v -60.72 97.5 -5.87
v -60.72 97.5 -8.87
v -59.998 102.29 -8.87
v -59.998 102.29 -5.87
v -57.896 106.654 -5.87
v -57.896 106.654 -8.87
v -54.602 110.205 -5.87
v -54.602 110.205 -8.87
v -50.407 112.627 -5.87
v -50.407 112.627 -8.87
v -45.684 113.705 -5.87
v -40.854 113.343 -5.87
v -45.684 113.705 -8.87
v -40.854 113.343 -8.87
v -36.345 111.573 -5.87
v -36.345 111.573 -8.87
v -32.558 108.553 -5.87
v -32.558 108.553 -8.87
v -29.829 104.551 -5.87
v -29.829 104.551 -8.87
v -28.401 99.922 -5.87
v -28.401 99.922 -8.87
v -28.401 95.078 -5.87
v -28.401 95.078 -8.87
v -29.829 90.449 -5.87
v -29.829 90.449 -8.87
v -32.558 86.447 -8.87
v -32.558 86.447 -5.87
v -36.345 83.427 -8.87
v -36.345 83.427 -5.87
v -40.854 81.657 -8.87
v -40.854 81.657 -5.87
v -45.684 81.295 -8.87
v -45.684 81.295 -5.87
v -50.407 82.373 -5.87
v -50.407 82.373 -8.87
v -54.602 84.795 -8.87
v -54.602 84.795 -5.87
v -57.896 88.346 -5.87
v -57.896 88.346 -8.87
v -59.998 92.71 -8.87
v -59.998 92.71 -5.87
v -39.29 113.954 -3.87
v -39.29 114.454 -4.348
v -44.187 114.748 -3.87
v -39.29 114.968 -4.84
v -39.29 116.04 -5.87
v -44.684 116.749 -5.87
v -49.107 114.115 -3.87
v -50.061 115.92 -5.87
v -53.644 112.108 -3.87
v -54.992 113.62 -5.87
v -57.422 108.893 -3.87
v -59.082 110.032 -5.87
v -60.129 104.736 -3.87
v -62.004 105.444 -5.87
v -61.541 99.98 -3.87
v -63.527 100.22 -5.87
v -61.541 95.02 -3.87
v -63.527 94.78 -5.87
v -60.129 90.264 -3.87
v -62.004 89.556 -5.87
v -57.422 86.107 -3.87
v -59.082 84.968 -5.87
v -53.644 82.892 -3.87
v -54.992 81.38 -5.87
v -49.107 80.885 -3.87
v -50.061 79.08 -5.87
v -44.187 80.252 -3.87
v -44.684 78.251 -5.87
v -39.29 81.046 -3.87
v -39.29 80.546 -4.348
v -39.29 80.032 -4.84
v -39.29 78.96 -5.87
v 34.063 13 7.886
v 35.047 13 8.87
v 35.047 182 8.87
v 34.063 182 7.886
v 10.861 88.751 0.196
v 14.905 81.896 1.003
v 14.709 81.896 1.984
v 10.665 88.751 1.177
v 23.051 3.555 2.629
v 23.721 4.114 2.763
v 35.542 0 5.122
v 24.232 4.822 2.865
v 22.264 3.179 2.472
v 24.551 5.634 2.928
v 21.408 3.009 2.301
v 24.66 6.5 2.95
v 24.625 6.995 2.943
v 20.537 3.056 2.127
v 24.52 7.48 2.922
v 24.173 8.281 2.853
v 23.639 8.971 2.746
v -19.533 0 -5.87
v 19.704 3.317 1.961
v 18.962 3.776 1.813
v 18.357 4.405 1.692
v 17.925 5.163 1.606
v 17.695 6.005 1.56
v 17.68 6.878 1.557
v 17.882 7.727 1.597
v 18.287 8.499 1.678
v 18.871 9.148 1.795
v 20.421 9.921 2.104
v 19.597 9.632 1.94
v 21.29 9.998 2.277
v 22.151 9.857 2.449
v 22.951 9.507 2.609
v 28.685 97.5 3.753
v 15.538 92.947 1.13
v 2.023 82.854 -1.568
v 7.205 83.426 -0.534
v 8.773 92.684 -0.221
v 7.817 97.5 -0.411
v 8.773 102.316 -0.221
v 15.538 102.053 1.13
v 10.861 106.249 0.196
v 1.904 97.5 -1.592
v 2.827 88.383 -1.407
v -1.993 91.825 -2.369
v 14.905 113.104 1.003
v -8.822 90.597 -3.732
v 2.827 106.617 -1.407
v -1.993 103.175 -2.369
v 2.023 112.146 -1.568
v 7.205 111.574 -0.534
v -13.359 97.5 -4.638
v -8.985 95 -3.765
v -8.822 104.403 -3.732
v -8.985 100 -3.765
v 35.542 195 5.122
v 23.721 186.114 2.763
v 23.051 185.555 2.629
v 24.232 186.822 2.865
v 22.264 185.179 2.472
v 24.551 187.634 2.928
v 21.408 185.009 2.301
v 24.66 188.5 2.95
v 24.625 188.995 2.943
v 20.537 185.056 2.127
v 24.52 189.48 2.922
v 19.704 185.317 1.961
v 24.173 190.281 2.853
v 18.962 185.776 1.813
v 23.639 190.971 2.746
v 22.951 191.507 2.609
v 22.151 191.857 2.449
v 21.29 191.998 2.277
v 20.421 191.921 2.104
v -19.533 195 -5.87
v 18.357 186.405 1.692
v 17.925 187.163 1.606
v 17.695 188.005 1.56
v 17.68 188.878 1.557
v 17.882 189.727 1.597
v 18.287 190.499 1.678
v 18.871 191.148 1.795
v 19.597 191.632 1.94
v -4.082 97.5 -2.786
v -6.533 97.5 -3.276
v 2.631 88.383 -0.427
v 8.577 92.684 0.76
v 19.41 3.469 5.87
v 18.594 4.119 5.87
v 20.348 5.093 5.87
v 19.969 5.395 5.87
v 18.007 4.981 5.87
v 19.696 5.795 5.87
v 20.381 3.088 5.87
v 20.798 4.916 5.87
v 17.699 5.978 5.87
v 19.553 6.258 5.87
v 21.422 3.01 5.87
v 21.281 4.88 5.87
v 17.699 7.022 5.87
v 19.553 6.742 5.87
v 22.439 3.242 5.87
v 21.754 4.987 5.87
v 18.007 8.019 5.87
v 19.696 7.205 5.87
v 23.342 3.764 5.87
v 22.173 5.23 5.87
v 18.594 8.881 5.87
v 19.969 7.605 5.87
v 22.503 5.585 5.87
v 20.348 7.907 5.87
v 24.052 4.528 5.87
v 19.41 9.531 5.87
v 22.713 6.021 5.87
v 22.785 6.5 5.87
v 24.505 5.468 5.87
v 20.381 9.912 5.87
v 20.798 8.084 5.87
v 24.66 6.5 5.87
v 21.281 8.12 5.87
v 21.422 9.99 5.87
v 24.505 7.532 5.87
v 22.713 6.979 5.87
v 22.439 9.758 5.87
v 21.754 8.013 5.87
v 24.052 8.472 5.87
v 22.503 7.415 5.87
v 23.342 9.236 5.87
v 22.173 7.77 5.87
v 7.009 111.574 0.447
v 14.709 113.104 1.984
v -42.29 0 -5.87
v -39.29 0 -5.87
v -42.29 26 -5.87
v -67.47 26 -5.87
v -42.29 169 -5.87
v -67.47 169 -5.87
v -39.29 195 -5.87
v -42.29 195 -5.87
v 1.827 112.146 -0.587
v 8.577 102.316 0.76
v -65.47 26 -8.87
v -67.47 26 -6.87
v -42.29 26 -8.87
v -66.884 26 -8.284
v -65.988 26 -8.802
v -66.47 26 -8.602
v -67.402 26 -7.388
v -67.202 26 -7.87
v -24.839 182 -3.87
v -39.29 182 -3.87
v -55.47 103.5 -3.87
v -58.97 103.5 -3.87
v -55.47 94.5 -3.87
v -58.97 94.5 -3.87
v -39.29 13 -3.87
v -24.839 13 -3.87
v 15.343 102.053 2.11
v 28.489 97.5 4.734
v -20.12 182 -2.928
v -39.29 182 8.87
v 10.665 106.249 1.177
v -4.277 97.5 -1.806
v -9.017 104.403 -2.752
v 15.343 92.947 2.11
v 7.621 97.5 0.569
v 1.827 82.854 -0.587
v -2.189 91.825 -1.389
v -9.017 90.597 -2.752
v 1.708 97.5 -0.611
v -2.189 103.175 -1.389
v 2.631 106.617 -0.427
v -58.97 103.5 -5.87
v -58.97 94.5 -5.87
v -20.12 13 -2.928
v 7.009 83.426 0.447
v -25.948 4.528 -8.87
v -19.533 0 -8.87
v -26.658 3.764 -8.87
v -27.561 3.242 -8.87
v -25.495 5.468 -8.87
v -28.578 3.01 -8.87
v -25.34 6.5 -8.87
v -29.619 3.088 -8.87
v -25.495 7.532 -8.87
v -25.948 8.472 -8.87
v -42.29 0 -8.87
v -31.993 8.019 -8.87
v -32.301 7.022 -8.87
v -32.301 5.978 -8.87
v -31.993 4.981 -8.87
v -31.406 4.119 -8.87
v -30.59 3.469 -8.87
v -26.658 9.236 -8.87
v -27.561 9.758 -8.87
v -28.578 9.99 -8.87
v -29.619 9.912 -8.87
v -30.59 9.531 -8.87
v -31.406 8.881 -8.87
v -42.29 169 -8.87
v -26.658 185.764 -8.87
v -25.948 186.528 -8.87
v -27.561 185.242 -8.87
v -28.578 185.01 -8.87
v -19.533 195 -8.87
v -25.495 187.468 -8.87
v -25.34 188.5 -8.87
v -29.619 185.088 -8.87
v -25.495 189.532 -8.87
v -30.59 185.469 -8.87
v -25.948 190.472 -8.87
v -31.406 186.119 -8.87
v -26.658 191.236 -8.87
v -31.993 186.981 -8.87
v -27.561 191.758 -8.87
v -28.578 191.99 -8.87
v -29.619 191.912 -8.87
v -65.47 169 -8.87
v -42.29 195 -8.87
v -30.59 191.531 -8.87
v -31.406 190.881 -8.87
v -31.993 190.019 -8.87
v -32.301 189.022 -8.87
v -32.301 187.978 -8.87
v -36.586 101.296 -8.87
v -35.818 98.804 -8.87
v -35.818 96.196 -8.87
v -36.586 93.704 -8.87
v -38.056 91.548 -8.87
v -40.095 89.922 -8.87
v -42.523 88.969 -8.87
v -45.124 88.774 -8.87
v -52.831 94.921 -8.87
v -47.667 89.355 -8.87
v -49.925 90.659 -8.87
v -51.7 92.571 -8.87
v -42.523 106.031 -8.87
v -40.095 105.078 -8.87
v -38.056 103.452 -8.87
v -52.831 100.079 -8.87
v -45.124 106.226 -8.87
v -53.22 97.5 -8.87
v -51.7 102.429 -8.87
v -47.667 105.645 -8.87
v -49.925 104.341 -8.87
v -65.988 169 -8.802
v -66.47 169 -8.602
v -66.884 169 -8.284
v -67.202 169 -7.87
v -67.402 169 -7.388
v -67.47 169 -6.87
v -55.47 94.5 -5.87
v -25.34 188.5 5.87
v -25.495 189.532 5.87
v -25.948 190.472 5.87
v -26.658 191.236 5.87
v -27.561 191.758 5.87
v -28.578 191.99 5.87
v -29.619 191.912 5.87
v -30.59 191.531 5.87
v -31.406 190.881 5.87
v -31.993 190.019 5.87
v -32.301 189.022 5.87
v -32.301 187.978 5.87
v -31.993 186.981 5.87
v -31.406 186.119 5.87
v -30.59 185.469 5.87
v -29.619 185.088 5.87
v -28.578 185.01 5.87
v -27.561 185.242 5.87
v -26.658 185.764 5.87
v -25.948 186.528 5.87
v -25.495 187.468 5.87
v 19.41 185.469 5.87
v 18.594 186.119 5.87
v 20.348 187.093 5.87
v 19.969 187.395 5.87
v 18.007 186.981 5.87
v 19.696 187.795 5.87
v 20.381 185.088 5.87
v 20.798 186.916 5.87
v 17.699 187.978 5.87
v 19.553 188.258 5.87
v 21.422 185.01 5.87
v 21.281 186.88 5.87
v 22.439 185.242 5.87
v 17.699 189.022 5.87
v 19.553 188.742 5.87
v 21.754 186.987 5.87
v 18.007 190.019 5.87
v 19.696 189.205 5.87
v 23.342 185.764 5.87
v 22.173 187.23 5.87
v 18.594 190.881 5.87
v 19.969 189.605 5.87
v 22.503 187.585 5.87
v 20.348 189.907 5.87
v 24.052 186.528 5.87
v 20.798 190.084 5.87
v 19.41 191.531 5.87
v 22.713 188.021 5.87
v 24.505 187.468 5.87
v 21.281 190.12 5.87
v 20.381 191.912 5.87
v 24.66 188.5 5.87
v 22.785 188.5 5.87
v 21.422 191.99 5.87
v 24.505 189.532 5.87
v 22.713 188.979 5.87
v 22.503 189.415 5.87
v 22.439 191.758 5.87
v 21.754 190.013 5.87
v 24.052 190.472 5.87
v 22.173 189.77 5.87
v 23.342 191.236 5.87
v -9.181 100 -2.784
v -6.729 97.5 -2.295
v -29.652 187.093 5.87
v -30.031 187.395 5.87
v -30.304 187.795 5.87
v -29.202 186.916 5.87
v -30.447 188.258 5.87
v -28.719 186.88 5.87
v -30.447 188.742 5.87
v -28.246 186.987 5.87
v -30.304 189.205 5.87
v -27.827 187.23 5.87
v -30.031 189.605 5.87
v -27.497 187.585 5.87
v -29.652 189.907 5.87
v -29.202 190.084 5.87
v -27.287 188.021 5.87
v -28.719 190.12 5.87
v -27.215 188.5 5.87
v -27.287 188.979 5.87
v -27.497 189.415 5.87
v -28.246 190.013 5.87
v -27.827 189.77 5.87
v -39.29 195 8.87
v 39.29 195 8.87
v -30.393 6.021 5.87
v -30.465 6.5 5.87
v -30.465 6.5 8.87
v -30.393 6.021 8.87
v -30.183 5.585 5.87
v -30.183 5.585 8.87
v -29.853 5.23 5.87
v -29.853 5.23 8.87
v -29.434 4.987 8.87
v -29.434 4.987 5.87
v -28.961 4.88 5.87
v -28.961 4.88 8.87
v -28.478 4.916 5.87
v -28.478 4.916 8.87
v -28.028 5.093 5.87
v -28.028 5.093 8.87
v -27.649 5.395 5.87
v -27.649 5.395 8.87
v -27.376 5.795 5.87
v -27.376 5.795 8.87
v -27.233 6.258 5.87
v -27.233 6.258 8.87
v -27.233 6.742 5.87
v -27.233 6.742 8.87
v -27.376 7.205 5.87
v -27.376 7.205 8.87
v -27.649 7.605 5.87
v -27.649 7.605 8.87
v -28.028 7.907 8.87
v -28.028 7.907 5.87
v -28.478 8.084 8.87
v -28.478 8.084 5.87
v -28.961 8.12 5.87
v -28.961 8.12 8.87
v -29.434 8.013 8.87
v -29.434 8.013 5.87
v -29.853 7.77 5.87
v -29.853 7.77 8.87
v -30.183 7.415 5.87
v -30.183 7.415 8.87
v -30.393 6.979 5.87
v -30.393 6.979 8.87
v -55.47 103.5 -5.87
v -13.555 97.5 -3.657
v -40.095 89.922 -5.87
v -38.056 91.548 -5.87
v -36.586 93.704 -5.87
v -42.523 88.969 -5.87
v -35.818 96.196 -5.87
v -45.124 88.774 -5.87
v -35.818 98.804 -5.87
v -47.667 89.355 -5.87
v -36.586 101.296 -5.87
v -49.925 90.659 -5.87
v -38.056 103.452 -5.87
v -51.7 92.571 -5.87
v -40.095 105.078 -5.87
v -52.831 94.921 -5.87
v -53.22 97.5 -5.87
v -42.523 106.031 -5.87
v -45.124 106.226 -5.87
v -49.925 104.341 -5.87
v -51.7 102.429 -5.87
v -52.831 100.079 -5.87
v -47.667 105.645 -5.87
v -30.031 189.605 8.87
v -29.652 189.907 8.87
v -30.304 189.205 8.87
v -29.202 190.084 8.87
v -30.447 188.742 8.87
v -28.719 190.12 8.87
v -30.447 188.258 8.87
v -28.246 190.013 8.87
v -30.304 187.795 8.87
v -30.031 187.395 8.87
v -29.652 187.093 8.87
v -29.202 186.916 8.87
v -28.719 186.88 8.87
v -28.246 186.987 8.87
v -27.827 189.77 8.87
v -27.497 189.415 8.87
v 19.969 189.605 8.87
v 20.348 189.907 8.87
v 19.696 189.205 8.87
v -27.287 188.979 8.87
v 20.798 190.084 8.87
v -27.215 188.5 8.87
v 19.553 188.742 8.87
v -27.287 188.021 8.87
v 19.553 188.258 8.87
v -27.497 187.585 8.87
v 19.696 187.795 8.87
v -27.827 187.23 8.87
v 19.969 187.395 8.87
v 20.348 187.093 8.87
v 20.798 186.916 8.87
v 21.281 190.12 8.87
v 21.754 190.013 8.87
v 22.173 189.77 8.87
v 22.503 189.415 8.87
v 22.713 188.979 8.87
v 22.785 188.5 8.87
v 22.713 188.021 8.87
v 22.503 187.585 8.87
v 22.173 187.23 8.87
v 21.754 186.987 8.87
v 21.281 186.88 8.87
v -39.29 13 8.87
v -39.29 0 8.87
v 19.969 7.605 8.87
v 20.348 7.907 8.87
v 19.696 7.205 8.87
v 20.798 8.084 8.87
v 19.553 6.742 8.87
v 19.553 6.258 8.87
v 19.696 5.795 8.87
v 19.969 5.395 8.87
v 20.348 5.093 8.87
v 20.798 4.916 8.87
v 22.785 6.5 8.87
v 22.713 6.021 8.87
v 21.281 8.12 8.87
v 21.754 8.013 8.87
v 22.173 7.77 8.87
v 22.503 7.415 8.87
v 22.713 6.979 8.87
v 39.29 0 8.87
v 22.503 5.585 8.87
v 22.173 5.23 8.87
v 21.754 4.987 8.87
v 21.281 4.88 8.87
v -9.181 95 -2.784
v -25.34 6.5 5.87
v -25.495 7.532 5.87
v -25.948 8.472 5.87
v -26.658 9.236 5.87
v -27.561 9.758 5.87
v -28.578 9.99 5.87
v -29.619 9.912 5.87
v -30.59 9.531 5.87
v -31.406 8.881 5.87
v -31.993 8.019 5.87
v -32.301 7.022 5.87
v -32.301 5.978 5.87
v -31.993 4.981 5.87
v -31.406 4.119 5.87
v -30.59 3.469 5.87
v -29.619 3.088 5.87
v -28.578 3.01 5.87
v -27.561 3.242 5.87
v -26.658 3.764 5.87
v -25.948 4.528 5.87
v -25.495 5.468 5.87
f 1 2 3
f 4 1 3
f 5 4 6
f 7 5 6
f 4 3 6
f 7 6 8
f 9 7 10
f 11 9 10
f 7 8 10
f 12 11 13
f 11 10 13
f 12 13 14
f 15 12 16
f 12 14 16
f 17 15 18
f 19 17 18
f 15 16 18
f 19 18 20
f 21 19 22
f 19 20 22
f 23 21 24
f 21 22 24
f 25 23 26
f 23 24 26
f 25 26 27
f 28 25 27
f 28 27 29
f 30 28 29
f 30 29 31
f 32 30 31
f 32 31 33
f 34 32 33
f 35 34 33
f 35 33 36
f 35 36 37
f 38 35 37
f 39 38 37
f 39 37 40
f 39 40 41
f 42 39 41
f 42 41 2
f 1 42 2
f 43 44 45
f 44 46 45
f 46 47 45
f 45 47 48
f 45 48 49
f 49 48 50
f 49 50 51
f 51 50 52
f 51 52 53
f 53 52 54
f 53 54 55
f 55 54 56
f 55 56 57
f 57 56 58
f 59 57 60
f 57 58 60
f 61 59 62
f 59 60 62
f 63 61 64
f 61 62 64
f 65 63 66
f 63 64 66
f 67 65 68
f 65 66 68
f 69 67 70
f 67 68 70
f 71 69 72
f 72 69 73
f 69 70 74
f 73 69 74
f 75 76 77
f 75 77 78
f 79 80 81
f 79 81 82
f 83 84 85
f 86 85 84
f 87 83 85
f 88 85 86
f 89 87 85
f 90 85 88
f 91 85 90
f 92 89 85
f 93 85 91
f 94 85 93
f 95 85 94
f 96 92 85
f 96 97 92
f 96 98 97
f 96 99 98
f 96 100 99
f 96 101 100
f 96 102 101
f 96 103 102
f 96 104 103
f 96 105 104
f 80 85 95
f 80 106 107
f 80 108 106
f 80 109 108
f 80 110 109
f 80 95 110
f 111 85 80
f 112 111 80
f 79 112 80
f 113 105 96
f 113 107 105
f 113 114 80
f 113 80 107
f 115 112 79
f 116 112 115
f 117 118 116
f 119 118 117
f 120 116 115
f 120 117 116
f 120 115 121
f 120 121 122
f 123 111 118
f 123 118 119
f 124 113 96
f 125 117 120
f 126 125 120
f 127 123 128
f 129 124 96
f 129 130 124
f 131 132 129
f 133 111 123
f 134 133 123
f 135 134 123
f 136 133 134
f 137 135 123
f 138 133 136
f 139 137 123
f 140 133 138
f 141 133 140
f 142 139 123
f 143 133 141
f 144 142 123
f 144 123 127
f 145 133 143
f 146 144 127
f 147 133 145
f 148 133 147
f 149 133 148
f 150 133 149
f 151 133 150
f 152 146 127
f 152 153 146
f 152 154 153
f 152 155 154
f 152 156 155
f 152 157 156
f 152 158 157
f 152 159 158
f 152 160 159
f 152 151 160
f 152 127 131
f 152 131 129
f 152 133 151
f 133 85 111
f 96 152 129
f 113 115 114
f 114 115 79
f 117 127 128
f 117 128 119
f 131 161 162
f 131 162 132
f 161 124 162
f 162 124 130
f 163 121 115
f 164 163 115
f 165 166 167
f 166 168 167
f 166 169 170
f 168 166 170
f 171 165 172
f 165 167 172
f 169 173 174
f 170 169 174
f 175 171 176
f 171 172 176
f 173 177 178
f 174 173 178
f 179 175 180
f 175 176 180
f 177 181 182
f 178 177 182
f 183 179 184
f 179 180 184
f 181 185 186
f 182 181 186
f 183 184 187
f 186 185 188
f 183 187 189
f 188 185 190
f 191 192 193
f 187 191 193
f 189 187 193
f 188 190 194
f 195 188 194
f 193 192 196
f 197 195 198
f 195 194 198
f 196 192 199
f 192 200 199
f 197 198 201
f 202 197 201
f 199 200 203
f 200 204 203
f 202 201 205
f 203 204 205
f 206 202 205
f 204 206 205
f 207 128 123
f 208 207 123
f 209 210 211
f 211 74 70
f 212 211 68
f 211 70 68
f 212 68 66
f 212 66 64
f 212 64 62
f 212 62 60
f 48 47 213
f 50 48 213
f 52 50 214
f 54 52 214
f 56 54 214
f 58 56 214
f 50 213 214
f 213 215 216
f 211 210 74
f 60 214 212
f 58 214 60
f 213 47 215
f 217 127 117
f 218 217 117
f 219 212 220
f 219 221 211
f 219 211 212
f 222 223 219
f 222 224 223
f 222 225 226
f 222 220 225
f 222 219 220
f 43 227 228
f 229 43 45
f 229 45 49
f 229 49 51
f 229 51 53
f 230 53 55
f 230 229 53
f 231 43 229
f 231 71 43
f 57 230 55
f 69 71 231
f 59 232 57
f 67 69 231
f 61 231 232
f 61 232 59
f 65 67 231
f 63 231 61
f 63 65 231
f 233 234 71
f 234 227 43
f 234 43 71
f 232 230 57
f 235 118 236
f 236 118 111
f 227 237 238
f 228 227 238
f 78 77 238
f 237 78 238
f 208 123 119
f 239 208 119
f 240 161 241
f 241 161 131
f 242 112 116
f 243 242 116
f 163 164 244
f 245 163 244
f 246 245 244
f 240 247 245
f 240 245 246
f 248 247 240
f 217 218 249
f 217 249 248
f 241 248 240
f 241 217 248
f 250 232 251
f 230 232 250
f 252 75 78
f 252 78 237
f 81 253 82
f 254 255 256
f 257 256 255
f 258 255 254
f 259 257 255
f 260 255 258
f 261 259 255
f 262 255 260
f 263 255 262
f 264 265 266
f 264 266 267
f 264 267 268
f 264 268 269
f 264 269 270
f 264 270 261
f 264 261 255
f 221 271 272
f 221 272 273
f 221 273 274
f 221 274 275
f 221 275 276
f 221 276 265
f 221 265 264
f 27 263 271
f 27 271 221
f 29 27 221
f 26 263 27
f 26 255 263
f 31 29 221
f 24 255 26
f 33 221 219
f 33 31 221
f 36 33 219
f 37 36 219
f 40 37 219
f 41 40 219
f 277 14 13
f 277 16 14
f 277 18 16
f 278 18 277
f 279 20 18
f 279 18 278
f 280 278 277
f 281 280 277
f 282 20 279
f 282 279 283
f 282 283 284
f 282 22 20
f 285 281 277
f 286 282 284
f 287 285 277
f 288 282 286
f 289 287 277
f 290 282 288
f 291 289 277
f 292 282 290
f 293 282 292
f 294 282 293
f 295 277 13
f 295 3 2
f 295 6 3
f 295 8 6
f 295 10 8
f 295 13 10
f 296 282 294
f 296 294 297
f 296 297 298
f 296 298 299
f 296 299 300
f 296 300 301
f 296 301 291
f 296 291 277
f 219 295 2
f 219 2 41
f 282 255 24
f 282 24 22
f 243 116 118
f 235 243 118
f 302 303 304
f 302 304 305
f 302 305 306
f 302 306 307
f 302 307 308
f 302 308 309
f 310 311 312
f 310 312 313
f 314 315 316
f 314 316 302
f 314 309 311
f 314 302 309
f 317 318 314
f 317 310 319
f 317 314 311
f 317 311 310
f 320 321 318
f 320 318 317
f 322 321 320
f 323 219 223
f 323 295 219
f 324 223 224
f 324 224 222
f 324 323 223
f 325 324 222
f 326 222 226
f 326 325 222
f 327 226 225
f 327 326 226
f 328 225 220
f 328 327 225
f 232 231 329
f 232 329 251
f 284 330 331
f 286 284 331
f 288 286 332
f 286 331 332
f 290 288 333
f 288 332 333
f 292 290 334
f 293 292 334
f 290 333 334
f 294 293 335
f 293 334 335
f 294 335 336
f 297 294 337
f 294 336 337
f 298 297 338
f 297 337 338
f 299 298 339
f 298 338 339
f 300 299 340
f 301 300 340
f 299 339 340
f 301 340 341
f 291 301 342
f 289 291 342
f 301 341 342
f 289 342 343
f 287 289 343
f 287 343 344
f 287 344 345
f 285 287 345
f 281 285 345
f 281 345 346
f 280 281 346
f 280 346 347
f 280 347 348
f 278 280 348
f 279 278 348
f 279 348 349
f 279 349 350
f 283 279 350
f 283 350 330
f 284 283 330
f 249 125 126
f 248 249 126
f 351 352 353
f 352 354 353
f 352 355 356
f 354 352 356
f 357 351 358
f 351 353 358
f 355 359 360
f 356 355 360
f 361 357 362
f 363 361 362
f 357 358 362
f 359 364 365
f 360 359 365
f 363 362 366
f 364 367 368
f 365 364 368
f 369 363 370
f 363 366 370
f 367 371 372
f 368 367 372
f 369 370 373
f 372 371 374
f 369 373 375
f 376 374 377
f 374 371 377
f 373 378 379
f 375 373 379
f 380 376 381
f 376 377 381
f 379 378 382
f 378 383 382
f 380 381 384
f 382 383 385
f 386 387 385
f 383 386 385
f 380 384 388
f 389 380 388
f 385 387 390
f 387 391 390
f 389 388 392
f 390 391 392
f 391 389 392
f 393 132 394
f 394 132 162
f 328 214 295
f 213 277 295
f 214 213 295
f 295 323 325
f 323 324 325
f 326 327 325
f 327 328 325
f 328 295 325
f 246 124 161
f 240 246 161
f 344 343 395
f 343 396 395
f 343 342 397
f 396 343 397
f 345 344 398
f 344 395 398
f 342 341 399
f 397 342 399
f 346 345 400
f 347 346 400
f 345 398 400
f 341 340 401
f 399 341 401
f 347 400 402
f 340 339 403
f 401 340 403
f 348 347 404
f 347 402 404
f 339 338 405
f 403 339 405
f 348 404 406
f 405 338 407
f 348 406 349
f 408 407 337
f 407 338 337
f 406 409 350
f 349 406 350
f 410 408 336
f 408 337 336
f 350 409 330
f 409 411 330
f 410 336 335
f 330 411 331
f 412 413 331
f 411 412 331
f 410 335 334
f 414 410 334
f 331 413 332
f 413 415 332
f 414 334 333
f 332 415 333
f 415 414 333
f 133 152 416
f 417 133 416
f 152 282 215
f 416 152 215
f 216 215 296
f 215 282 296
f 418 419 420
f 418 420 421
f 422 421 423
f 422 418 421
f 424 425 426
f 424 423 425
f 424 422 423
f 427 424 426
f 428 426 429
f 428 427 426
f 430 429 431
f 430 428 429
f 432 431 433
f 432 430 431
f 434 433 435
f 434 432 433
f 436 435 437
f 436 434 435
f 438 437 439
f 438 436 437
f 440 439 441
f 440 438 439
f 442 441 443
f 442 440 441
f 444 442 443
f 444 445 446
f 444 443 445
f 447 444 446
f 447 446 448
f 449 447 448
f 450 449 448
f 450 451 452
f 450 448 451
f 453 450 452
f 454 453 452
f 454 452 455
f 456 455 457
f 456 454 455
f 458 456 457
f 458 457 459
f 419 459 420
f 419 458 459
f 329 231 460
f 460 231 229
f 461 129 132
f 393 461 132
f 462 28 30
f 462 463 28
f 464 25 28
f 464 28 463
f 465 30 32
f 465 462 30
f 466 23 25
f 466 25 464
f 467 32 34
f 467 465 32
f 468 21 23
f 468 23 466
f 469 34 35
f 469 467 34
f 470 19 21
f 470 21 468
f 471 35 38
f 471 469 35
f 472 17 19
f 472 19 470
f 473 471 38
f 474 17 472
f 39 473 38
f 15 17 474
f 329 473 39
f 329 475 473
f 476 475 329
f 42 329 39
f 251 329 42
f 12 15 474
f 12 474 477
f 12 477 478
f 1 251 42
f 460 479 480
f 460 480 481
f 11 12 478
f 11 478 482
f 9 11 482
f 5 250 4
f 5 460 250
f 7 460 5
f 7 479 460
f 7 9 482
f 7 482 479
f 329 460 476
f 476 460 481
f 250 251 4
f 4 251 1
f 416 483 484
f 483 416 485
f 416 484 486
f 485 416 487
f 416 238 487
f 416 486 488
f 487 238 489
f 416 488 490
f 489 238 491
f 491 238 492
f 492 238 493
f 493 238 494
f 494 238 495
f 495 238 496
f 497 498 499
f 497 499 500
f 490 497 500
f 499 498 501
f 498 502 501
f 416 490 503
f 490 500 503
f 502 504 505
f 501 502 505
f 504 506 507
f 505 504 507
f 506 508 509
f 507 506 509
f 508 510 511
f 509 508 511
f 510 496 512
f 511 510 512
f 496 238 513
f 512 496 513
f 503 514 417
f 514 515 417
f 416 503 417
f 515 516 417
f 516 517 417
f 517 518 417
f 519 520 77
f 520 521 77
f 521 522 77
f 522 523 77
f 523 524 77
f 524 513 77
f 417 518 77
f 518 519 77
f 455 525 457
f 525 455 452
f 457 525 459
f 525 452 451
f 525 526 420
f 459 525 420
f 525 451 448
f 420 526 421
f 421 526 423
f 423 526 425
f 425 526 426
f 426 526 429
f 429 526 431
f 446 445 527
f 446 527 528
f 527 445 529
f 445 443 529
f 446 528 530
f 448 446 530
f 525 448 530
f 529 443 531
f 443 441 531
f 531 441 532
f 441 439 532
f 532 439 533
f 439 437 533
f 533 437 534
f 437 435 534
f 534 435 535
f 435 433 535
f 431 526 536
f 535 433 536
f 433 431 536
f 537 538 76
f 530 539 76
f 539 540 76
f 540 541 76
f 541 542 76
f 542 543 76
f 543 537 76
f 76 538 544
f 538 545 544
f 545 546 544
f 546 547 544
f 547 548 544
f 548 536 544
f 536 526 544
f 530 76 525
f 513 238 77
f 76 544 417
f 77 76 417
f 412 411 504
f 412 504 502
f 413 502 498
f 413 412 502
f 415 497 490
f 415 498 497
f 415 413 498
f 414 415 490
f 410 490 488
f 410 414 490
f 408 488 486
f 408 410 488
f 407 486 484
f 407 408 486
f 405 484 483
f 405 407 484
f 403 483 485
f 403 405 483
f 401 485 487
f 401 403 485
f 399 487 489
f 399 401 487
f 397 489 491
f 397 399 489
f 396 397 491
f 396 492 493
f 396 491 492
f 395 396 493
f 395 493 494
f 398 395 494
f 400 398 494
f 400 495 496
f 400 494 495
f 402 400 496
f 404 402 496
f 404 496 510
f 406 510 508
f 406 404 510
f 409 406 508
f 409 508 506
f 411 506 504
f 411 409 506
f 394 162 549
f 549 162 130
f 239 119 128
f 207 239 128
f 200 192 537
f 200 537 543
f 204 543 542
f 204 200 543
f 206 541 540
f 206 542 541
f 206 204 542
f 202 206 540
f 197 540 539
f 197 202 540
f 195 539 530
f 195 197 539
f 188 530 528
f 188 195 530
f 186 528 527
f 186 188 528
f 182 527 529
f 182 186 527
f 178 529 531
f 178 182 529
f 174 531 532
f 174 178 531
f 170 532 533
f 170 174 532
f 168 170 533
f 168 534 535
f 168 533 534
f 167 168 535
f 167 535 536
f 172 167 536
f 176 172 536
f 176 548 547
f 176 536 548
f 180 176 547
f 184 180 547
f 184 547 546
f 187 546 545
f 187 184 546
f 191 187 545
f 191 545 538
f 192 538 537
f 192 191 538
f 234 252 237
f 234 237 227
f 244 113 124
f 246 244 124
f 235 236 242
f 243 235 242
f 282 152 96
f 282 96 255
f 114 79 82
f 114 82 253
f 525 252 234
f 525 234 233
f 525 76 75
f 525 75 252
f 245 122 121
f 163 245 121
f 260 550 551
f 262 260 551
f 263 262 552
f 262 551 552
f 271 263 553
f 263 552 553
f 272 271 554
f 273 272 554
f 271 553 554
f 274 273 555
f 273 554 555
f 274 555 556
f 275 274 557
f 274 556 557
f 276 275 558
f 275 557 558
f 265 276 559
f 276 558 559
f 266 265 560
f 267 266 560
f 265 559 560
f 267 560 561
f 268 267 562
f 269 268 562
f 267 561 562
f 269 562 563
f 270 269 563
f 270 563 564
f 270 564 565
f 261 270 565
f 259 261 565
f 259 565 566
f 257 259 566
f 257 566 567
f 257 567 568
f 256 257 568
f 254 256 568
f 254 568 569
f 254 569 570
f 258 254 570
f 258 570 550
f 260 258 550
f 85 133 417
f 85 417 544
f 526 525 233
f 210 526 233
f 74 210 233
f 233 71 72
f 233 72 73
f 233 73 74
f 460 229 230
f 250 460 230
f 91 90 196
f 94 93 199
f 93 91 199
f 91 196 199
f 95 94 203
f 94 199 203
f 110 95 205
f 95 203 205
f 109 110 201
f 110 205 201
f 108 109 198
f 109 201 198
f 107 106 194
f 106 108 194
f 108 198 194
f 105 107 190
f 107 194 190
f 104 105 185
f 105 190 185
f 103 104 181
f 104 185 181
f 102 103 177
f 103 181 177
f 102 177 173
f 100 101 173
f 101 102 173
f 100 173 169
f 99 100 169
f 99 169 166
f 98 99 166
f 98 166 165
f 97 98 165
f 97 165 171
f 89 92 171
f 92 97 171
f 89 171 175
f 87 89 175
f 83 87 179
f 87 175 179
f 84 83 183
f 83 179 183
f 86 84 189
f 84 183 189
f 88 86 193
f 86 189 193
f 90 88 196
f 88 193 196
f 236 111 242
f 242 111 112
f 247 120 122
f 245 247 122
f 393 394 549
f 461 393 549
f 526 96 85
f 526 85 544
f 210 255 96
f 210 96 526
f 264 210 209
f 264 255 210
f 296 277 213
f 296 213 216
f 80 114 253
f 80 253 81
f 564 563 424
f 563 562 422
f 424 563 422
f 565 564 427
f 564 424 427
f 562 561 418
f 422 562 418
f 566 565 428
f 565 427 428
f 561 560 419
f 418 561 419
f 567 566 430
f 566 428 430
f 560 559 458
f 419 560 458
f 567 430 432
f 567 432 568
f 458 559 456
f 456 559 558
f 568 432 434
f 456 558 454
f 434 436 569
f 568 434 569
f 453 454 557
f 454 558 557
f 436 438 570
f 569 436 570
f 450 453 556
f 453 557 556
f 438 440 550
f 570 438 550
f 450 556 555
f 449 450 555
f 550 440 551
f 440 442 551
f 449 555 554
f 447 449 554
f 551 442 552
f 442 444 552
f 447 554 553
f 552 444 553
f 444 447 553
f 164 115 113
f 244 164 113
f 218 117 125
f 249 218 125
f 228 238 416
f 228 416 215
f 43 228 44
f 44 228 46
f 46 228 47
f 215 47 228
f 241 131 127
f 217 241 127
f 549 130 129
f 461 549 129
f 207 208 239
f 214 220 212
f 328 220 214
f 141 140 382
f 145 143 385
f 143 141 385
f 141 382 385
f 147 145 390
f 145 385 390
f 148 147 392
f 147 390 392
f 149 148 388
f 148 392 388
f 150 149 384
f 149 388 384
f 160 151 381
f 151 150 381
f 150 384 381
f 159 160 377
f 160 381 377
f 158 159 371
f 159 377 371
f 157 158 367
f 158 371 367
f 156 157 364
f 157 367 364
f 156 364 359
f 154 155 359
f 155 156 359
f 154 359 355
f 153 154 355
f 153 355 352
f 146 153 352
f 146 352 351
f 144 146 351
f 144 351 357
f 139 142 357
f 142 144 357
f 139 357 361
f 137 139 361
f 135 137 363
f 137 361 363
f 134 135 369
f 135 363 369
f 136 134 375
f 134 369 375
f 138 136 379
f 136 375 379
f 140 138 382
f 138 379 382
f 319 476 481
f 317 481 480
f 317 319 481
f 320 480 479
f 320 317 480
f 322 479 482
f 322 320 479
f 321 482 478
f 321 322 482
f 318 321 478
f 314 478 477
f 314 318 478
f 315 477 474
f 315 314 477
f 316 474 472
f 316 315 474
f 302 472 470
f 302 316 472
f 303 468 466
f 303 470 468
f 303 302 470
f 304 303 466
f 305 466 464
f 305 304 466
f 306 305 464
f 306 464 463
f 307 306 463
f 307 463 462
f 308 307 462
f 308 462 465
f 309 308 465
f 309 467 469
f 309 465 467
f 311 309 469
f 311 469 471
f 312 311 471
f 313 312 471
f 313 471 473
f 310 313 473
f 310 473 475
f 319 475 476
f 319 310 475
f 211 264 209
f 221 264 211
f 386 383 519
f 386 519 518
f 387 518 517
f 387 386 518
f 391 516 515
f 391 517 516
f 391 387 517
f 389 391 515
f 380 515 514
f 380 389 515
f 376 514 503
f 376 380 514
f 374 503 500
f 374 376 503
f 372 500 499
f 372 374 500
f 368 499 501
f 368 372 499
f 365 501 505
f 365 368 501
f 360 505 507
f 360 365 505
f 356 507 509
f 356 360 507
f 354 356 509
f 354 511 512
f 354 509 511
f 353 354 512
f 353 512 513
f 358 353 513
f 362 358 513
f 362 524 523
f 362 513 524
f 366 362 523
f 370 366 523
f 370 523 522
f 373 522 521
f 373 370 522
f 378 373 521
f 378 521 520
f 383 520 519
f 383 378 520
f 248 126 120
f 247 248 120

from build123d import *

# Parameters (mm, degrees)
CROQUIS1_W                 = 78.58
CROQUIS1_H                 = 17.74
SALIENTE_EXTRUIR1_DEPTH    = 195
CORTAR_EXTRUIR1_DEPTH      = 200.116501074
CORTAR_EXTRUIR1_DEPTH_BACK = 200.116501074
CHAFL_N1_SIZE2             = 3.821967962
CHAFL_N1_SIZE              = 3
CROQUIS4_W                 = 3
CROQUIS4_H                 = 195
SALIENTE_EXTRUIR2_DEPTH    = 3
CROQUIS5_W                 = 25.18
CROQUIS5_H                 = 143
SALIENTE_EXTRUIR3_DEPTH    = 3
REDONDEO1_R                = 2
CORTAR_EXTRUIR2_DEPTH      = 208.103617786
CORTAR_EXTRUIR2_DEPTH_BACK = 208.103617786
CROQUIS6_R                 = 1.625
CORTAR_EXTRUIR3_START      = -3
CROQUIS7_R                 = 3.5
CORTAR_EXTRUIR3_DEPTH      = 205.103617786
CROQUIS8_R                 = 16.25
CROQUIS8_R_2               = 8.75
CORTAR_EXTRUIR4_DEPTH      = 3
CROQUIS9_R                 = 17.25
SALIENTE_EXTRUIR4_DEPTH    = 2
CHAFL_N2_SIZE              = 2
CORTAR_EXTRUIR6_DEPTH      = 208.103617786
CORTAR_EXTRUIR6_DEPTH_BACK = 208.103617786
CROQUIS10_W                = 3.5
CROQUIS10_H                = 9
CORTAR_EXTRUIR7_DEPTH      = 1
CORTAR_EXTRUIR8_START      = -13
CORTAR_EXTRUIR8_DEPTH      = 169


with BuildPart() as part:
    # Croquis1 → Saliente-Extruir1 (new body)
    with BuildSketch(Plane(origin=(0, 0, 0), x_dir=(1, 0, 0), z_dir=(0, 1, 0))):
        Rectangle(CROQUIS1_W, CROQUIS1_H)
    extrude(amount=SALIENTE_EXTRUIR1_DEPTH)

    # Croquis2 → Cortar-Extruir1 (cut, two sides: drawn at the far end of the back side and taken through both)
    with BuildSketch(Plane.XZ.offset(-CORTAR_EXTRUIR1_DEPTH_BACK)):
        Polygon((39.29, 5.87), (-19.532543769, -5.87), (-19.532543769, -8.87), (39.29, -8.87), align=None)
    extrude(amount=CORTAR_EXTRUIR1_DEPTH + CORTAR_EXTRUIR1_DEPTH_BACK, mode=Mode.SUBTRACT)

    # Chaflán1
    chafl_n1_edges = [part.edges().sort_by_distance(p)[0] for p in [
        (39.29, 97.5, 5.87),
    ]]
    chafl_n1_side = [part.faces().sort_by_distance(p)[0] for p in [
        (39.29, 97.5, 5.93),
    ]]
    chamfer(chafl_n1_edges, length=CHAFL_N1_SIZE - 0.0001, length2=CHAFL_N1_SIZE2 - 0.0001, reference=chafl_n1_side[0])  # a hair under: the kernel refuses the full size

    # Croquis4 → Saliente-Extruir2 (add)
    with BuildSketch(Plane(origin=(0, 0, -8.87), x_dir=(-1, 0, 0), z_dir=(0, 0, -1))):
        with Locations((40.79, 97.5)):
            Rectangle(CROQUIS4_W, CROQUIS4_H)
    extrude(amount=-SALIENTE_EXTRUIR2_DEPTH)

    # Croquis5 → Saliente-Extruir3 (add)
    with BuildSketch(Plane(origin=(0, 0, -8.87), x_dir=(-1, 0, 0), z_dir=(0, 0, -1))):
        with Locations((54.88, 97.5)):
            Rectangle(CROQUIS5_W, CROQUIS5_H)
    extrude(amount=-SALIENTE_EXTRUIR3_DEPTH)

    # Redondeo1
    redondeo1_edges = [part.edges().sort_by_distance(p)[0] for p in [
        (-67.47, 97.5, -8.87),
    ]]
    fillet(redondeo1_edges, radius=REDONDEO1_R)

    # Croquis6 → Cortar-Extruir2 (cut, two sides: drawn at the far end of the back side and taken through both)
    with BuildSketch(Plane.XY.offset(8.87).offset(-CORTAR_EXTRUIR2_DEPTH_BACK)):
        with Locations((-28.84, 188.5)):
            Circle(CROQUIS6_R)
        with Locations((21.16, 188.5)):
            Circle(CROQUIS6_R)
        with Locations((21.16, 6.5)):
            Circle(CROQUIS6_R)
        with Locations(Location((-28.84, 6.5, 0), (0, 0, 180))):
            Circle(CROQUIS6_R)
    extrude(amount=CORTAR_EXTRUIR2_DEPTH + CORTAR_EXTRUIR2_DEPTH_BACK, mode=Mode.SUBTRACT)

    # Croquis7 → Cortar-Extruir3 (cut, through all)
    with BuildSketch(Plane.XY.offset(8.87).offset(CORTAR_EXTRUIR3_START)):
        with Locations((-28.84, 188.5)):
            Circle(CROQUIS7_R)
        with Locations((21.16, 188.5)):
            Circle(CROQUIS7_R)
        with Locations((-28.84, 6.5)):
            Circle(CROQUIS7_R)
        with Locations((21.16, 6.5)):
            Circle(CROQUIS7_R)
    extrude(amount=-CORTAR_EXTRUIR3_DEPTH, mode=Mode.SUBTRACT)

    # Croquis8 → Cortar-Extruir4 (cut)
    with BuildSketch(Plane(origin=(0, 0, -8.87), x_dir=(-1, 0, 0), z_dir=(0, 0, -1))):
        with Locations((44.469949206, 97.5)):
            Circle(CROQUIS8_R)
        with Locations((44.469949206, 97.5)):
            Circle(CROQUIS8_R_2, mode=Mode.SUBTRACT)
    extrude(amount=-CORTAR_EXTRUIR4_DEPTH, mode=Mode.SUBTRACT)

    # Croquis9 → Saliente-Extruir4 (add)
    with BuildSketch(Plane.XY.offset(-5.87)):
        with Locations((-44.469949206, 97.5)):
            Circle(CROQUIS9_R)
    extrude(amount=SALIENTE_EXTRUIR4_DEPTH)

    # Chaflán2
    chafl_n2_edges = [part.edges().sort_by_distance(p)[0] for p in [
        (-61.719949206, 97.5, -5.87),
    ]]
    chamfer(chafl_n2_edges, length=CHAFL_N2_SIZE - 0.0001)  # a hair under: the kernel refuses the full size

    # Croquis10 → Cortar-Extruir6 (cut, two sides: drawn at the far end of the back side and taken through both)
    with BuildSketch(Plane(origin=(0, 0, -8.87), x_dir=(-1, 0, 0), z_dir=(0, 0, -1)).offset(-CORTAR_EXTRUIR6_DEPTH_BACK)):
        with Locations((57.22, 99)):
            Rectangle(CROQUIS10_W, CROQUIS10_H)
    extrude(amount=CORTAR_EXTRUIR6_DEPTH + CORTAR_EXTRUIR6_DEPTH_BACK, mode=Mode.SUBTRACT)

    # Croquis11 → Cortar-Extruir7 (cut)
    with BuildSketch(Plane(origin=(0.378430223, 0, -1.896101224), x_dir=(-0.9806591733939511, 0, -0.1957232373487947), z_dir=(0.19572323734879468, 0, -0.980659173393951))):
        Polygon((-28.864838216, 97.5), (-15.458781877, 92.947300595), (-7.58538371, 97.5), (-15.458781877, 102.052699405), align=None)
        Polygon((-10.689272405, 88.750905342), (-6.961025568, 83.426417054), (-14.813228871, 81.895762524), align=None)
        Polygon((-8.5598171, 92.683515176), (-1.676899864, 82.853690645), (9.381652734, 90.596972535), (4.548100867, 97.5), (9.381652734, 104.403027465), (-1.676899864, 112.146309355), (-8.5598171, 102.316484824), (-2.496901935, 106.616608043), (2.418010331, 103.175149425), (-1.555772077, 97.5), (2.418010331, 91.824850575), (-2.496901935, 88.383391957), align=None)
        Polygon((7.048100867, 97.5), (9.548100867, 95), (14.008259291, 97.5), (9.548100867, 100), align=None)
        Polygon((-14.813228871, 113.104237476), (-10.689272405, 106.249094658), (-6.961025568, 111.573582946), align=None)
    extrude(amount=-CORTAR_EXTRUIR7_DEPTH, mode=Mode.SUBTRACT)

    # Croquis12 → Cortar-Extruir8 (cut)
    with BuildSketch(Plane.XZ.offset(CORTAR_EXTRUIR8_START)):
        Polygon((-20.119713481, -2.92802248), (-24.839433576, -3.87), (-39.29, -3.87), (-39.29, 8.87), (35.047359313, 8.87), (34.063379787, 7.886020474), align=None)
    extrude(amount=-CORTAR_EXTRUIR8_DEPTH, mode=Mode.SUBTRACT)


solid = part.part
